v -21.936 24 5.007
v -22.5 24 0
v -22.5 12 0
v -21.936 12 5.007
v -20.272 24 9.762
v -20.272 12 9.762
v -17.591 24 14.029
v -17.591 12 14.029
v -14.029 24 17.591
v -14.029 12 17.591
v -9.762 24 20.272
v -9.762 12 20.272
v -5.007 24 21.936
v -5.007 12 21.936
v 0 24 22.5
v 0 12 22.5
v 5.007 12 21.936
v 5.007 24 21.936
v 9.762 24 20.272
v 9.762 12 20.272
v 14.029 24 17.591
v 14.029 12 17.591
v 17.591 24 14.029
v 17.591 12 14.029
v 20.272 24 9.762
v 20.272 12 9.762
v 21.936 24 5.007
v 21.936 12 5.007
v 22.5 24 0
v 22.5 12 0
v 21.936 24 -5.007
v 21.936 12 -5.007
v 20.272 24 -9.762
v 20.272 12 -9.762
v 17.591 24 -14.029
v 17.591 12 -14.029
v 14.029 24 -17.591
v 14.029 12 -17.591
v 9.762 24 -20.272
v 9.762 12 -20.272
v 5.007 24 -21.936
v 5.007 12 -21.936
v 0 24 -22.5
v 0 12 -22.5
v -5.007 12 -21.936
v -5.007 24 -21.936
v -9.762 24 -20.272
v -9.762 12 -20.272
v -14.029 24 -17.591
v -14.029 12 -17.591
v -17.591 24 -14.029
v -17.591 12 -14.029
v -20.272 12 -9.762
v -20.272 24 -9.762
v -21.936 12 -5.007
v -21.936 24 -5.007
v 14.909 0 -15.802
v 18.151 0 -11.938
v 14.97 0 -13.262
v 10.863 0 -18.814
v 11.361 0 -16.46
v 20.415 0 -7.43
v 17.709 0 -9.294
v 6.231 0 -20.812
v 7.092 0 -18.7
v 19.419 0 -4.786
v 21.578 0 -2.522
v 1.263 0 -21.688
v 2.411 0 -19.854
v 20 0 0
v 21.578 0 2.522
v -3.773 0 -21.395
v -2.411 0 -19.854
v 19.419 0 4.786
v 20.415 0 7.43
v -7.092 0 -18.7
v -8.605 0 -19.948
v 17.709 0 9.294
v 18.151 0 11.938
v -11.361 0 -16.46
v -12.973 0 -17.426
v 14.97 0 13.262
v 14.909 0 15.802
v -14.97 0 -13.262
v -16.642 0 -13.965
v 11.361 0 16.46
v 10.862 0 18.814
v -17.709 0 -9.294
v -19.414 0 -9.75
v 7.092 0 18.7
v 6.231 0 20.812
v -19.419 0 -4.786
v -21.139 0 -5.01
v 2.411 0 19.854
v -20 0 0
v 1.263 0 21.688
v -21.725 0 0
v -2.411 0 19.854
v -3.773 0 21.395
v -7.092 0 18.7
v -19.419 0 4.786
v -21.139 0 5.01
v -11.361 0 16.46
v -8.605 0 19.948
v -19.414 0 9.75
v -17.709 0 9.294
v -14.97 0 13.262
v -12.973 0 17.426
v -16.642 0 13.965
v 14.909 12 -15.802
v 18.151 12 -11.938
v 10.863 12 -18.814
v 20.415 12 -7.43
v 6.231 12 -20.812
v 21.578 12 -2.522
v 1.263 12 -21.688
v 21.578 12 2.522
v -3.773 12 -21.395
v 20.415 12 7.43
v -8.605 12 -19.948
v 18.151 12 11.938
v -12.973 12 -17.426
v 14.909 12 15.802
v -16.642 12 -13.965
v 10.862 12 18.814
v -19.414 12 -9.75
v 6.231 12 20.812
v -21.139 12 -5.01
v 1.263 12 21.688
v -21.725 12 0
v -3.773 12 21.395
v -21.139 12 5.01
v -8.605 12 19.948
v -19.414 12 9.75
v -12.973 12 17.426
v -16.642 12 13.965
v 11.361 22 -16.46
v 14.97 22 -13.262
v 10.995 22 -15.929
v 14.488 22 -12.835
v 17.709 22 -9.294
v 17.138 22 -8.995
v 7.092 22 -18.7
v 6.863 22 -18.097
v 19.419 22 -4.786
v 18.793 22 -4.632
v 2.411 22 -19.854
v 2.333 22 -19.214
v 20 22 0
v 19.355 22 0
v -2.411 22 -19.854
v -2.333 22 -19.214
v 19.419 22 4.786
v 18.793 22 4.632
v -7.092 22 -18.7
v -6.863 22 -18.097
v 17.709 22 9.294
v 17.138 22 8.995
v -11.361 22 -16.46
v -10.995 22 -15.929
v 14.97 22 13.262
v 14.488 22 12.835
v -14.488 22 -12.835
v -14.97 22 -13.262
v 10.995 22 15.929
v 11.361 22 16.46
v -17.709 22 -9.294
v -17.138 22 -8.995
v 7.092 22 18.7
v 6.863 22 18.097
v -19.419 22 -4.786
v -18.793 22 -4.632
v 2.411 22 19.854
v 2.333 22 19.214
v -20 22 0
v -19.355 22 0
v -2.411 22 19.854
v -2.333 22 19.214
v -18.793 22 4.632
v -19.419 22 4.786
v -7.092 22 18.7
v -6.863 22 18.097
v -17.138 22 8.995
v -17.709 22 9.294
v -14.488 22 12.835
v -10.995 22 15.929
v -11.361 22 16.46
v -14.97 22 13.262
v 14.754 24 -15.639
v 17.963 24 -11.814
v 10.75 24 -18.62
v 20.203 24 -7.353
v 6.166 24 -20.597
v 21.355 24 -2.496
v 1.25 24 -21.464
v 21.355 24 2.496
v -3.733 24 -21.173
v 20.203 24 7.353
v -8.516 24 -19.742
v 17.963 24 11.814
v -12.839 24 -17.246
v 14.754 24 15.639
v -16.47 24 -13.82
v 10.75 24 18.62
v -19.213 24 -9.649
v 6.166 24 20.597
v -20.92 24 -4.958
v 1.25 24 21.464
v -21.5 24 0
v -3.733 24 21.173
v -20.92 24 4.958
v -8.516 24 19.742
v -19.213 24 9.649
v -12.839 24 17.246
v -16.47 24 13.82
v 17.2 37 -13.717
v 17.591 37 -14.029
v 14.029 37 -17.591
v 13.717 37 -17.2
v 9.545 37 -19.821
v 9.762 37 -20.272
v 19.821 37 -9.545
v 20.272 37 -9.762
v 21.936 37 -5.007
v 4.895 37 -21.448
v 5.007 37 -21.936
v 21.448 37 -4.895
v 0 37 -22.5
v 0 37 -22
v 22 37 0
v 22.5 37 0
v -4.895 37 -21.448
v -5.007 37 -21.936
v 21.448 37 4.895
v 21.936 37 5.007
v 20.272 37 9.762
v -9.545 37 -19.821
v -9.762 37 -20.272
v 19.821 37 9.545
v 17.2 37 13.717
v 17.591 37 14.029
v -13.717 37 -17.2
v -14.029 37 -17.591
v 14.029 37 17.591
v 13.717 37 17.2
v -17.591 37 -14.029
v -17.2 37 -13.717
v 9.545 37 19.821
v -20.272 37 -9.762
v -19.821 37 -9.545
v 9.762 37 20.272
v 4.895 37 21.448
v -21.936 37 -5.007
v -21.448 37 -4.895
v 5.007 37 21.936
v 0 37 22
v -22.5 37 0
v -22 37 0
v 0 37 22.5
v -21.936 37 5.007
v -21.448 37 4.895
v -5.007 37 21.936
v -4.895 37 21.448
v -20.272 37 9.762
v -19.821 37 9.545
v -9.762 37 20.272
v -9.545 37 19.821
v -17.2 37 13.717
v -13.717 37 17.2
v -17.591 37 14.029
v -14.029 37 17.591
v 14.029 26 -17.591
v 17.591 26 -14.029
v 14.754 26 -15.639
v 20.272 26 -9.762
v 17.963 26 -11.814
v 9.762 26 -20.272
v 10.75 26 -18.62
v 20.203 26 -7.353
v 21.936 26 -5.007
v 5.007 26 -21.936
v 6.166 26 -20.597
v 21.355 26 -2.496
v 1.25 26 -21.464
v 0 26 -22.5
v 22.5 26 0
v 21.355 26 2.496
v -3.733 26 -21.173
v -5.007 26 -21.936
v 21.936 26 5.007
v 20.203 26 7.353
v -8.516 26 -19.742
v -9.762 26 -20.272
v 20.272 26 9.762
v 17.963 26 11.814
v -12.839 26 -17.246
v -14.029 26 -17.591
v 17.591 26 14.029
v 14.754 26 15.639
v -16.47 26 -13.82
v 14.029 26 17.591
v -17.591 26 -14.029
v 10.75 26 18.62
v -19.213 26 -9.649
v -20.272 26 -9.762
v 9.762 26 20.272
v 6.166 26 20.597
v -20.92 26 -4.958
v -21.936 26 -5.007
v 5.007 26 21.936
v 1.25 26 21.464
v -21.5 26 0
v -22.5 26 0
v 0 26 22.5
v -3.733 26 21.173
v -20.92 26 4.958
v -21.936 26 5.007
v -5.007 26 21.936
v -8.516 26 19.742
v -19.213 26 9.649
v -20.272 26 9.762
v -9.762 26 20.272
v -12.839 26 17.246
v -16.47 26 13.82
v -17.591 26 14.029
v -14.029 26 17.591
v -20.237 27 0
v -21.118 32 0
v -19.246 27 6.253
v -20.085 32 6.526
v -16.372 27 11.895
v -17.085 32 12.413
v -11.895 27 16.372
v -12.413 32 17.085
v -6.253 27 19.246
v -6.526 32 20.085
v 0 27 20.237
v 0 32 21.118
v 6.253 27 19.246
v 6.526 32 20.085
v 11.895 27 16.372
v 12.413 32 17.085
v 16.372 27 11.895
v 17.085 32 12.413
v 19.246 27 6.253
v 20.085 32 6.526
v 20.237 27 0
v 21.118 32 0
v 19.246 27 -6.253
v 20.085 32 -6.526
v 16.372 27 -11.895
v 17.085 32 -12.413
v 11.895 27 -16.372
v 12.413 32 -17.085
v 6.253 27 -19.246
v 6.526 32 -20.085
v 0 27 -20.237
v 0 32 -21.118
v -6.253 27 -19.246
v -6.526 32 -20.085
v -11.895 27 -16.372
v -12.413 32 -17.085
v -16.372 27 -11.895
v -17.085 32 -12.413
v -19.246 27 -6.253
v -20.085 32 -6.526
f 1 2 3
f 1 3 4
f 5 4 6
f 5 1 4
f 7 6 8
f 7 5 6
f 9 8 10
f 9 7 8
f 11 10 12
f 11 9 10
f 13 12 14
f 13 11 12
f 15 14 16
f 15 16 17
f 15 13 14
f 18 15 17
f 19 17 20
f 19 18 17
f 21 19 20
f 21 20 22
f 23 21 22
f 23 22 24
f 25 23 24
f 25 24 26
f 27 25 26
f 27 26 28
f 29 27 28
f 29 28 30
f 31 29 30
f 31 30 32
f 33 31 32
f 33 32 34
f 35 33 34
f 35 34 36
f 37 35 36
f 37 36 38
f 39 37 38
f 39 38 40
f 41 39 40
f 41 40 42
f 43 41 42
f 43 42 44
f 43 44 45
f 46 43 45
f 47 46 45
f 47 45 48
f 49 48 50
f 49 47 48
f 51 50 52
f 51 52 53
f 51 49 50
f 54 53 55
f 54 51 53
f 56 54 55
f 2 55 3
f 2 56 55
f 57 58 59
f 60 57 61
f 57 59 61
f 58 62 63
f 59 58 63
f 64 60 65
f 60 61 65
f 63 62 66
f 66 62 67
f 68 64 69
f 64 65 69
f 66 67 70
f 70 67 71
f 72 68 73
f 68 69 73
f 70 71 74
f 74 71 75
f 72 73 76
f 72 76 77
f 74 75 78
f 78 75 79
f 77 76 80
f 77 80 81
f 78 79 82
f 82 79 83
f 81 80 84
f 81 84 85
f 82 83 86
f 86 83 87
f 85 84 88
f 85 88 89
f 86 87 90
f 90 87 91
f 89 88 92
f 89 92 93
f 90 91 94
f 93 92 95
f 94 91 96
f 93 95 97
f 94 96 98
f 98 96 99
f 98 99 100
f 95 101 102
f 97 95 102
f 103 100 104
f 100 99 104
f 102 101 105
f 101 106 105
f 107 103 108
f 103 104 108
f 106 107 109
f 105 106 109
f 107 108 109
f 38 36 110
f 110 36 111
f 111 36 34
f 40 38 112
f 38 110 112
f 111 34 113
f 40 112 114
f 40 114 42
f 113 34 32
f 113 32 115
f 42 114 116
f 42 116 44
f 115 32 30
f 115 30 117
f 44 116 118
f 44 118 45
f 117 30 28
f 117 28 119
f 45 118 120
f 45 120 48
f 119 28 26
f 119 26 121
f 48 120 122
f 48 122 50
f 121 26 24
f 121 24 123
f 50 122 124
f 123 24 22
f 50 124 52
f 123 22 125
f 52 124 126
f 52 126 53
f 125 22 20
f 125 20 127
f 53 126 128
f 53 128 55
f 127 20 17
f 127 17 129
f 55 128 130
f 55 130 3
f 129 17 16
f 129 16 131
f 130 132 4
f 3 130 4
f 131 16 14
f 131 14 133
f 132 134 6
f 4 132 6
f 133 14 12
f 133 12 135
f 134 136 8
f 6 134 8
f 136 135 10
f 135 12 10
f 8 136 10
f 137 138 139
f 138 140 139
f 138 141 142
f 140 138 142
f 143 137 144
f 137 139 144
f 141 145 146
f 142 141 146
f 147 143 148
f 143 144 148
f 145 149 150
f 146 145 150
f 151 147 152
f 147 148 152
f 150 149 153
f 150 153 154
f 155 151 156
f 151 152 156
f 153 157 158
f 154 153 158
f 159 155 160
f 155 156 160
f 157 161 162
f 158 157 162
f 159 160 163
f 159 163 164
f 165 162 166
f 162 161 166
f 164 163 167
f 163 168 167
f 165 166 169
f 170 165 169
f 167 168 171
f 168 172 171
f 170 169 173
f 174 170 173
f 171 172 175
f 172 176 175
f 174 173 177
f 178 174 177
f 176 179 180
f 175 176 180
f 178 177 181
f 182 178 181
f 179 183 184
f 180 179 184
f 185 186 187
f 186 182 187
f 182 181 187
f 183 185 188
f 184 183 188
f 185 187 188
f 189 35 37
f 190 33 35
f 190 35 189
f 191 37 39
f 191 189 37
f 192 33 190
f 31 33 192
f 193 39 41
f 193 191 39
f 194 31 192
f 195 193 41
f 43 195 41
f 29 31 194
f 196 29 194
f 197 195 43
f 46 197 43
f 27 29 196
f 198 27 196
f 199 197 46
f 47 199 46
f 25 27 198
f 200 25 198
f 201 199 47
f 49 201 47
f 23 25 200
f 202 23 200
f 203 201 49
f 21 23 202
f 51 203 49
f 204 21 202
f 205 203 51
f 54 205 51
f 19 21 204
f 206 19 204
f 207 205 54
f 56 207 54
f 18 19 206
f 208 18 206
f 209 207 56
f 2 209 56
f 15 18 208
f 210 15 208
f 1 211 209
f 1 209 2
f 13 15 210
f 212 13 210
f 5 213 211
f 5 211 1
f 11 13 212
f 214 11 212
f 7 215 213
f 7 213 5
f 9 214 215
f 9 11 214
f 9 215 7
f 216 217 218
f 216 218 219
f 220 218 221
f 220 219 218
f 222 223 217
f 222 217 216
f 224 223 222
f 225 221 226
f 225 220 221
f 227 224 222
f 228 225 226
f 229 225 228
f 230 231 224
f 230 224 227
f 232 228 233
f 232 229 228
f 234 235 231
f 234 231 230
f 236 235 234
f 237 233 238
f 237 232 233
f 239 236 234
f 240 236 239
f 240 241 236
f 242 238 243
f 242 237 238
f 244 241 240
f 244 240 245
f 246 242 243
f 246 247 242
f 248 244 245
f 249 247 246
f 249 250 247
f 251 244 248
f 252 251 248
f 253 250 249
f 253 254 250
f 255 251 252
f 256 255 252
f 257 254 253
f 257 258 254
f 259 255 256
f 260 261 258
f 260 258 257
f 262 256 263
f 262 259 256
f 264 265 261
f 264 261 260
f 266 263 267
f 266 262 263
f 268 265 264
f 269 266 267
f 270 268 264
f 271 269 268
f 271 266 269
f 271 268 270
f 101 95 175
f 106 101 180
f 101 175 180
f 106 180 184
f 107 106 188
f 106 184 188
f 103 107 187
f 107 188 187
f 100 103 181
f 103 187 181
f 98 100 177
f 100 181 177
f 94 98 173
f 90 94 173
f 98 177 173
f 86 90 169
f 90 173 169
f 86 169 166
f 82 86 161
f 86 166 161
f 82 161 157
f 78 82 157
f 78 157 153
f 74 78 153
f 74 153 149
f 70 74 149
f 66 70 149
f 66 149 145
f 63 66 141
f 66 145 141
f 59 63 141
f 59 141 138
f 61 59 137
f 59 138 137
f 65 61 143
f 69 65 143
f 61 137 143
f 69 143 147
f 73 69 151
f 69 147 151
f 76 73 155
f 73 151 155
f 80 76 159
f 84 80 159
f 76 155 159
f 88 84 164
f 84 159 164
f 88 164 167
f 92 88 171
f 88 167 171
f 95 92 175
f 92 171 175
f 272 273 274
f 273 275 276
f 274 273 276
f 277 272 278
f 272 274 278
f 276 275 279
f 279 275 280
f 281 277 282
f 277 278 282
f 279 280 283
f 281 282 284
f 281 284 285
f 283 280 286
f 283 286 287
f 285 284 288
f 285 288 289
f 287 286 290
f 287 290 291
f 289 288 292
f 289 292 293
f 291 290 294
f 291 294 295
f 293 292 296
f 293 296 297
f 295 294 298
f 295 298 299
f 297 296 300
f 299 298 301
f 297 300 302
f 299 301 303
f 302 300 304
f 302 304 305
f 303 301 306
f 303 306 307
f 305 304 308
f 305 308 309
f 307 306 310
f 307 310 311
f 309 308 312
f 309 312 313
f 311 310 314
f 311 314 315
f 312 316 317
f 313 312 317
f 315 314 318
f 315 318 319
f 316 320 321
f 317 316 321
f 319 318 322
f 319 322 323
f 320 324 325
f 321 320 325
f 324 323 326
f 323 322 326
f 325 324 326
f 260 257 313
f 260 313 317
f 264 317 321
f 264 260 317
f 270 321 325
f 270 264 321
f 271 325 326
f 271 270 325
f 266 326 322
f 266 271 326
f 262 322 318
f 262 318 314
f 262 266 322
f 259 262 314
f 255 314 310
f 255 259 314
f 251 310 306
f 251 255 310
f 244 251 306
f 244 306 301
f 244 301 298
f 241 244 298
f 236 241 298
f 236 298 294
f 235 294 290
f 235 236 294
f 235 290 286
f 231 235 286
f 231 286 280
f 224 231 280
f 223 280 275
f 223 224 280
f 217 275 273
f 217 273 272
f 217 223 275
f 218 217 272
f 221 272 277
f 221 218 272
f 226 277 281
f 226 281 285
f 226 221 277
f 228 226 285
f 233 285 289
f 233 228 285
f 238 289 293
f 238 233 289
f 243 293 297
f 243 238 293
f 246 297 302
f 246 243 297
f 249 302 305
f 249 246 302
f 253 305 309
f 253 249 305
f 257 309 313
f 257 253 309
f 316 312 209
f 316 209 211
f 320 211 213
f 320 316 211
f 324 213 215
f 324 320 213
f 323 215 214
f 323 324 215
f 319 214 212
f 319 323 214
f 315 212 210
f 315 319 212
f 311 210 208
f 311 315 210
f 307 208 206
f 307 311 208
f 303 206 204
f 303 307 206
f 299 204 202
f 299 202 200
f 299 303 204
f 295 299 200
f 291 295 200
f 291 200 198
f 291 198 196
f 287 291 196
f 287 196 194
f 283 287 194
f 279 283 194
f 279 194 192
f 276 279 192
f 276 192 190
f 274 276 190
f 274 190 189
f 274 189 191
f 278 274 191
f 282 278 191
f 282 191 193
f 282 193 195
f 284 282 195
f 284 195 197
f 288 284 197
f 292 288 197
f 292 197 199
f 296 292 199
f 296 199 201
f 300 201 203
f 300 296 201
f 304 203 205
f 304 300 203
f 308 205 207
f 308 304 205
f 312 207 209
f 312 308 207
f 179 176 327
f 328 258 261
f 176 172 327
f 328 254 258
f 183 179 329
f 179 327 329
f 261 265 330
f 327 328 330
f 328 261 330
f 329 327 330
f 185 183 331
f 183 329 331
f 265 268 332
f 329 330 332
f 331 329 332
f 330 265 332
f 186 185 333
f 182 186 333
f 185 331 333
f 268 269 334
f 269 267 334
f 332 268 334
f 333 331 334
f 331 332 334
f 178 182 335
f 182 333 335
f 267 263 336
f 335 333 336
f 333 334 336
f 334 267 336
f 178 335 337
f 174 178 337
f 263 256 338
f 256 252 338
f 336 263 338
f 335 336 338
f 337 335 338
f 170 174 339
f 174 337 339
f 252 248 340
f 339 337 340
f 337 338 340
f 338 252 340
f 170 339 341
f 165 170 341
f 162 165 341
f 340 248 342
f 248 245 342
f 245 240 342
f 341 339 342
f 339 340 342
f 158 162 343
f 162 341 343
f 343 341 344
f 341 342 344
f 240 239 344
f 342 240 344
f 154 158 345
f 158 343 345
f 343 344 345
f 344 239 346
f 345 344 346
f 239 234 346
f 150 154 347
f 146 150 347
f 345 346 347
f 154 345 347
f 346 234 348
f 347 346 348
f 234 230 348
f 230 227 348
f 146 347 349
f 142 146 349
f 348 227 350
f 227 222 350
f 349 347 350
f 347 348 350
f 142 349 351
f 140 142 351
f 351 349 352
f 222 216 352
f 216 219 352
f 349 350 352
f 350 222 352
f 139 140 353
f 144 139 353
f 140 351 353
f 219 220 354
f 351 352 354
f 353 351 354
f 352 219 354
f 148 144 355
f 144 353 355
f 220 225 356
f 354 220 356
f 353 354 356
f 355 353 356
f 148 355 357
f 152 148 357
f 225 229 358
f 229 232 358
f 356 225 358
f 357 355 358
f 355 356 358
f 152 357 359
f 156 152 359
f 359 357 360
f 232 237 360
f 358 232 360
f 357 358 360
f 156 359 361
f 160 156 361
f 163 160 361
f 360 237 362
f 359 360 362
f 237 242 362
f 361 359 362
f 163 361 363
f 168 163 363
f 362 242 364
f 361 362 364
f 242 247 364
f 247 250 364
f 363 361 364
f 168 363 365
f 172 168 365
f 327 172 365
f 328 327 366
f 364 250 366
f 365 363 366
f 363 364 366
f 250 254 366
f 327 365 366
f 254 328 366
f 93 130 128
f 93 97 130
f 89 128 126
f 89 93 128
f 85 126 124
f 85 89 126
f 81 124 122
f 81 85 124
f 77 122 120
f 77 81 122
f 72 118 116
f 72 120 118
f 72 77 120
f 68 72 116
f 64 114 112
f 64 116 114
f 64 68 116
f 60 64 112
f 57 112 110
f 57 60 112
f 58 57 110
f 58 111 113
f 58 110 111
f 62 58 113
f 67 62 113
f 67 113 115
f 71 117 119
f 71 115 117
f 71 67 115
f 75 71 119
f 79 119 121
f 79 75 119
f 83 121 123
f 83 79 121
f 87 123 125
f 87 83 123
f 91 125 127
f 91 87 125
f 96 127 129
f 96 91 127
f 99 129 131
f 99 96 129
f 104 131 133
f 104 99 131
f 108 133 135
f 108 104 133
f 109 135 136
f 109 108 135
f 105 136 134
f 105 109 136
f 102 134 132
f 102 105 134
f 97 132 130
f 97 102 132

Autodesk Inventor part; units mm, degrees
ref_plane "YZ Plane" through (0, 0, 0) normal (1, 0, 0) x (0, 1, 0)
ref_plane "XZ Plane" through (0, 0, 0) normal (0, 1, 0) x (-1, 0, 0)
ref_plane "XY Plane" through (0, 0, 0) normal (0, 0, 1) x (1, 0, 0)
sketch "Sketch1" plane through (0, 0, 0) normal (0, 0, 1) x (1, 0, 0)
  line L0 (-21.725, -10) -> (-22.225, -10) construction
  line L1 (-22.225, -10) -> (-22.225, 0) construction
  line L2 (-22.225, 0) -> (-21.725, 0) construction
  line L3 (-21.725, 0) -> (-21.725, -10) construction
  line L4 (-22, 37) -> (-19.3551, 22)
  line L5 (-22.5, 12) -> (-22.5, 24)
  line L6 (-22.5, 24) -> (-21.5, 24)
  line L7 (-21.5, 24) -> (-21.5, 26)
  line L8 (-21.5, 26) -> (-22.5, 26)
  line L9 (-22.5, 26) -> (-22.5, 37)
  line L10 (-22, 37) -> (-22.5, 37)
  line L11 (0, -19.4) -> (0, 46.4) projected
  line L12 (-20, 22) -> (-19.3551, 22)
  line L13 (-22.5, 12) -> (-21.725, 12)
  line L14 (-21.725, 12) -> (-21.725, 0)
  line L15 (-21.725, 0) -> (-20, 0)
  line L16 (-20, 0) -> (-20, 22)
  point P0 (0, 0)
  dimension "d0" = 10
  dimension "d1" = 22.225
  dimension "d3" = 0.5
  dimension "d5" = 11
  dimension "d6" = 2
  dimension "d7" = 22.5
  dimension "d12" = 1
  dimension "d18" = 0.5
  dimension "d19" = 10
  dimension "d20" = 15
  dimension "d21" = 12
  dimension "d22" = 37
  dimension "d24" = 20
revolve "Revolution1" add sketch "Sketch1" angle 360 about axis through (0, -10, 0) along (0, 1, 0)
properties part number "CapConeThin" material "Brass"
